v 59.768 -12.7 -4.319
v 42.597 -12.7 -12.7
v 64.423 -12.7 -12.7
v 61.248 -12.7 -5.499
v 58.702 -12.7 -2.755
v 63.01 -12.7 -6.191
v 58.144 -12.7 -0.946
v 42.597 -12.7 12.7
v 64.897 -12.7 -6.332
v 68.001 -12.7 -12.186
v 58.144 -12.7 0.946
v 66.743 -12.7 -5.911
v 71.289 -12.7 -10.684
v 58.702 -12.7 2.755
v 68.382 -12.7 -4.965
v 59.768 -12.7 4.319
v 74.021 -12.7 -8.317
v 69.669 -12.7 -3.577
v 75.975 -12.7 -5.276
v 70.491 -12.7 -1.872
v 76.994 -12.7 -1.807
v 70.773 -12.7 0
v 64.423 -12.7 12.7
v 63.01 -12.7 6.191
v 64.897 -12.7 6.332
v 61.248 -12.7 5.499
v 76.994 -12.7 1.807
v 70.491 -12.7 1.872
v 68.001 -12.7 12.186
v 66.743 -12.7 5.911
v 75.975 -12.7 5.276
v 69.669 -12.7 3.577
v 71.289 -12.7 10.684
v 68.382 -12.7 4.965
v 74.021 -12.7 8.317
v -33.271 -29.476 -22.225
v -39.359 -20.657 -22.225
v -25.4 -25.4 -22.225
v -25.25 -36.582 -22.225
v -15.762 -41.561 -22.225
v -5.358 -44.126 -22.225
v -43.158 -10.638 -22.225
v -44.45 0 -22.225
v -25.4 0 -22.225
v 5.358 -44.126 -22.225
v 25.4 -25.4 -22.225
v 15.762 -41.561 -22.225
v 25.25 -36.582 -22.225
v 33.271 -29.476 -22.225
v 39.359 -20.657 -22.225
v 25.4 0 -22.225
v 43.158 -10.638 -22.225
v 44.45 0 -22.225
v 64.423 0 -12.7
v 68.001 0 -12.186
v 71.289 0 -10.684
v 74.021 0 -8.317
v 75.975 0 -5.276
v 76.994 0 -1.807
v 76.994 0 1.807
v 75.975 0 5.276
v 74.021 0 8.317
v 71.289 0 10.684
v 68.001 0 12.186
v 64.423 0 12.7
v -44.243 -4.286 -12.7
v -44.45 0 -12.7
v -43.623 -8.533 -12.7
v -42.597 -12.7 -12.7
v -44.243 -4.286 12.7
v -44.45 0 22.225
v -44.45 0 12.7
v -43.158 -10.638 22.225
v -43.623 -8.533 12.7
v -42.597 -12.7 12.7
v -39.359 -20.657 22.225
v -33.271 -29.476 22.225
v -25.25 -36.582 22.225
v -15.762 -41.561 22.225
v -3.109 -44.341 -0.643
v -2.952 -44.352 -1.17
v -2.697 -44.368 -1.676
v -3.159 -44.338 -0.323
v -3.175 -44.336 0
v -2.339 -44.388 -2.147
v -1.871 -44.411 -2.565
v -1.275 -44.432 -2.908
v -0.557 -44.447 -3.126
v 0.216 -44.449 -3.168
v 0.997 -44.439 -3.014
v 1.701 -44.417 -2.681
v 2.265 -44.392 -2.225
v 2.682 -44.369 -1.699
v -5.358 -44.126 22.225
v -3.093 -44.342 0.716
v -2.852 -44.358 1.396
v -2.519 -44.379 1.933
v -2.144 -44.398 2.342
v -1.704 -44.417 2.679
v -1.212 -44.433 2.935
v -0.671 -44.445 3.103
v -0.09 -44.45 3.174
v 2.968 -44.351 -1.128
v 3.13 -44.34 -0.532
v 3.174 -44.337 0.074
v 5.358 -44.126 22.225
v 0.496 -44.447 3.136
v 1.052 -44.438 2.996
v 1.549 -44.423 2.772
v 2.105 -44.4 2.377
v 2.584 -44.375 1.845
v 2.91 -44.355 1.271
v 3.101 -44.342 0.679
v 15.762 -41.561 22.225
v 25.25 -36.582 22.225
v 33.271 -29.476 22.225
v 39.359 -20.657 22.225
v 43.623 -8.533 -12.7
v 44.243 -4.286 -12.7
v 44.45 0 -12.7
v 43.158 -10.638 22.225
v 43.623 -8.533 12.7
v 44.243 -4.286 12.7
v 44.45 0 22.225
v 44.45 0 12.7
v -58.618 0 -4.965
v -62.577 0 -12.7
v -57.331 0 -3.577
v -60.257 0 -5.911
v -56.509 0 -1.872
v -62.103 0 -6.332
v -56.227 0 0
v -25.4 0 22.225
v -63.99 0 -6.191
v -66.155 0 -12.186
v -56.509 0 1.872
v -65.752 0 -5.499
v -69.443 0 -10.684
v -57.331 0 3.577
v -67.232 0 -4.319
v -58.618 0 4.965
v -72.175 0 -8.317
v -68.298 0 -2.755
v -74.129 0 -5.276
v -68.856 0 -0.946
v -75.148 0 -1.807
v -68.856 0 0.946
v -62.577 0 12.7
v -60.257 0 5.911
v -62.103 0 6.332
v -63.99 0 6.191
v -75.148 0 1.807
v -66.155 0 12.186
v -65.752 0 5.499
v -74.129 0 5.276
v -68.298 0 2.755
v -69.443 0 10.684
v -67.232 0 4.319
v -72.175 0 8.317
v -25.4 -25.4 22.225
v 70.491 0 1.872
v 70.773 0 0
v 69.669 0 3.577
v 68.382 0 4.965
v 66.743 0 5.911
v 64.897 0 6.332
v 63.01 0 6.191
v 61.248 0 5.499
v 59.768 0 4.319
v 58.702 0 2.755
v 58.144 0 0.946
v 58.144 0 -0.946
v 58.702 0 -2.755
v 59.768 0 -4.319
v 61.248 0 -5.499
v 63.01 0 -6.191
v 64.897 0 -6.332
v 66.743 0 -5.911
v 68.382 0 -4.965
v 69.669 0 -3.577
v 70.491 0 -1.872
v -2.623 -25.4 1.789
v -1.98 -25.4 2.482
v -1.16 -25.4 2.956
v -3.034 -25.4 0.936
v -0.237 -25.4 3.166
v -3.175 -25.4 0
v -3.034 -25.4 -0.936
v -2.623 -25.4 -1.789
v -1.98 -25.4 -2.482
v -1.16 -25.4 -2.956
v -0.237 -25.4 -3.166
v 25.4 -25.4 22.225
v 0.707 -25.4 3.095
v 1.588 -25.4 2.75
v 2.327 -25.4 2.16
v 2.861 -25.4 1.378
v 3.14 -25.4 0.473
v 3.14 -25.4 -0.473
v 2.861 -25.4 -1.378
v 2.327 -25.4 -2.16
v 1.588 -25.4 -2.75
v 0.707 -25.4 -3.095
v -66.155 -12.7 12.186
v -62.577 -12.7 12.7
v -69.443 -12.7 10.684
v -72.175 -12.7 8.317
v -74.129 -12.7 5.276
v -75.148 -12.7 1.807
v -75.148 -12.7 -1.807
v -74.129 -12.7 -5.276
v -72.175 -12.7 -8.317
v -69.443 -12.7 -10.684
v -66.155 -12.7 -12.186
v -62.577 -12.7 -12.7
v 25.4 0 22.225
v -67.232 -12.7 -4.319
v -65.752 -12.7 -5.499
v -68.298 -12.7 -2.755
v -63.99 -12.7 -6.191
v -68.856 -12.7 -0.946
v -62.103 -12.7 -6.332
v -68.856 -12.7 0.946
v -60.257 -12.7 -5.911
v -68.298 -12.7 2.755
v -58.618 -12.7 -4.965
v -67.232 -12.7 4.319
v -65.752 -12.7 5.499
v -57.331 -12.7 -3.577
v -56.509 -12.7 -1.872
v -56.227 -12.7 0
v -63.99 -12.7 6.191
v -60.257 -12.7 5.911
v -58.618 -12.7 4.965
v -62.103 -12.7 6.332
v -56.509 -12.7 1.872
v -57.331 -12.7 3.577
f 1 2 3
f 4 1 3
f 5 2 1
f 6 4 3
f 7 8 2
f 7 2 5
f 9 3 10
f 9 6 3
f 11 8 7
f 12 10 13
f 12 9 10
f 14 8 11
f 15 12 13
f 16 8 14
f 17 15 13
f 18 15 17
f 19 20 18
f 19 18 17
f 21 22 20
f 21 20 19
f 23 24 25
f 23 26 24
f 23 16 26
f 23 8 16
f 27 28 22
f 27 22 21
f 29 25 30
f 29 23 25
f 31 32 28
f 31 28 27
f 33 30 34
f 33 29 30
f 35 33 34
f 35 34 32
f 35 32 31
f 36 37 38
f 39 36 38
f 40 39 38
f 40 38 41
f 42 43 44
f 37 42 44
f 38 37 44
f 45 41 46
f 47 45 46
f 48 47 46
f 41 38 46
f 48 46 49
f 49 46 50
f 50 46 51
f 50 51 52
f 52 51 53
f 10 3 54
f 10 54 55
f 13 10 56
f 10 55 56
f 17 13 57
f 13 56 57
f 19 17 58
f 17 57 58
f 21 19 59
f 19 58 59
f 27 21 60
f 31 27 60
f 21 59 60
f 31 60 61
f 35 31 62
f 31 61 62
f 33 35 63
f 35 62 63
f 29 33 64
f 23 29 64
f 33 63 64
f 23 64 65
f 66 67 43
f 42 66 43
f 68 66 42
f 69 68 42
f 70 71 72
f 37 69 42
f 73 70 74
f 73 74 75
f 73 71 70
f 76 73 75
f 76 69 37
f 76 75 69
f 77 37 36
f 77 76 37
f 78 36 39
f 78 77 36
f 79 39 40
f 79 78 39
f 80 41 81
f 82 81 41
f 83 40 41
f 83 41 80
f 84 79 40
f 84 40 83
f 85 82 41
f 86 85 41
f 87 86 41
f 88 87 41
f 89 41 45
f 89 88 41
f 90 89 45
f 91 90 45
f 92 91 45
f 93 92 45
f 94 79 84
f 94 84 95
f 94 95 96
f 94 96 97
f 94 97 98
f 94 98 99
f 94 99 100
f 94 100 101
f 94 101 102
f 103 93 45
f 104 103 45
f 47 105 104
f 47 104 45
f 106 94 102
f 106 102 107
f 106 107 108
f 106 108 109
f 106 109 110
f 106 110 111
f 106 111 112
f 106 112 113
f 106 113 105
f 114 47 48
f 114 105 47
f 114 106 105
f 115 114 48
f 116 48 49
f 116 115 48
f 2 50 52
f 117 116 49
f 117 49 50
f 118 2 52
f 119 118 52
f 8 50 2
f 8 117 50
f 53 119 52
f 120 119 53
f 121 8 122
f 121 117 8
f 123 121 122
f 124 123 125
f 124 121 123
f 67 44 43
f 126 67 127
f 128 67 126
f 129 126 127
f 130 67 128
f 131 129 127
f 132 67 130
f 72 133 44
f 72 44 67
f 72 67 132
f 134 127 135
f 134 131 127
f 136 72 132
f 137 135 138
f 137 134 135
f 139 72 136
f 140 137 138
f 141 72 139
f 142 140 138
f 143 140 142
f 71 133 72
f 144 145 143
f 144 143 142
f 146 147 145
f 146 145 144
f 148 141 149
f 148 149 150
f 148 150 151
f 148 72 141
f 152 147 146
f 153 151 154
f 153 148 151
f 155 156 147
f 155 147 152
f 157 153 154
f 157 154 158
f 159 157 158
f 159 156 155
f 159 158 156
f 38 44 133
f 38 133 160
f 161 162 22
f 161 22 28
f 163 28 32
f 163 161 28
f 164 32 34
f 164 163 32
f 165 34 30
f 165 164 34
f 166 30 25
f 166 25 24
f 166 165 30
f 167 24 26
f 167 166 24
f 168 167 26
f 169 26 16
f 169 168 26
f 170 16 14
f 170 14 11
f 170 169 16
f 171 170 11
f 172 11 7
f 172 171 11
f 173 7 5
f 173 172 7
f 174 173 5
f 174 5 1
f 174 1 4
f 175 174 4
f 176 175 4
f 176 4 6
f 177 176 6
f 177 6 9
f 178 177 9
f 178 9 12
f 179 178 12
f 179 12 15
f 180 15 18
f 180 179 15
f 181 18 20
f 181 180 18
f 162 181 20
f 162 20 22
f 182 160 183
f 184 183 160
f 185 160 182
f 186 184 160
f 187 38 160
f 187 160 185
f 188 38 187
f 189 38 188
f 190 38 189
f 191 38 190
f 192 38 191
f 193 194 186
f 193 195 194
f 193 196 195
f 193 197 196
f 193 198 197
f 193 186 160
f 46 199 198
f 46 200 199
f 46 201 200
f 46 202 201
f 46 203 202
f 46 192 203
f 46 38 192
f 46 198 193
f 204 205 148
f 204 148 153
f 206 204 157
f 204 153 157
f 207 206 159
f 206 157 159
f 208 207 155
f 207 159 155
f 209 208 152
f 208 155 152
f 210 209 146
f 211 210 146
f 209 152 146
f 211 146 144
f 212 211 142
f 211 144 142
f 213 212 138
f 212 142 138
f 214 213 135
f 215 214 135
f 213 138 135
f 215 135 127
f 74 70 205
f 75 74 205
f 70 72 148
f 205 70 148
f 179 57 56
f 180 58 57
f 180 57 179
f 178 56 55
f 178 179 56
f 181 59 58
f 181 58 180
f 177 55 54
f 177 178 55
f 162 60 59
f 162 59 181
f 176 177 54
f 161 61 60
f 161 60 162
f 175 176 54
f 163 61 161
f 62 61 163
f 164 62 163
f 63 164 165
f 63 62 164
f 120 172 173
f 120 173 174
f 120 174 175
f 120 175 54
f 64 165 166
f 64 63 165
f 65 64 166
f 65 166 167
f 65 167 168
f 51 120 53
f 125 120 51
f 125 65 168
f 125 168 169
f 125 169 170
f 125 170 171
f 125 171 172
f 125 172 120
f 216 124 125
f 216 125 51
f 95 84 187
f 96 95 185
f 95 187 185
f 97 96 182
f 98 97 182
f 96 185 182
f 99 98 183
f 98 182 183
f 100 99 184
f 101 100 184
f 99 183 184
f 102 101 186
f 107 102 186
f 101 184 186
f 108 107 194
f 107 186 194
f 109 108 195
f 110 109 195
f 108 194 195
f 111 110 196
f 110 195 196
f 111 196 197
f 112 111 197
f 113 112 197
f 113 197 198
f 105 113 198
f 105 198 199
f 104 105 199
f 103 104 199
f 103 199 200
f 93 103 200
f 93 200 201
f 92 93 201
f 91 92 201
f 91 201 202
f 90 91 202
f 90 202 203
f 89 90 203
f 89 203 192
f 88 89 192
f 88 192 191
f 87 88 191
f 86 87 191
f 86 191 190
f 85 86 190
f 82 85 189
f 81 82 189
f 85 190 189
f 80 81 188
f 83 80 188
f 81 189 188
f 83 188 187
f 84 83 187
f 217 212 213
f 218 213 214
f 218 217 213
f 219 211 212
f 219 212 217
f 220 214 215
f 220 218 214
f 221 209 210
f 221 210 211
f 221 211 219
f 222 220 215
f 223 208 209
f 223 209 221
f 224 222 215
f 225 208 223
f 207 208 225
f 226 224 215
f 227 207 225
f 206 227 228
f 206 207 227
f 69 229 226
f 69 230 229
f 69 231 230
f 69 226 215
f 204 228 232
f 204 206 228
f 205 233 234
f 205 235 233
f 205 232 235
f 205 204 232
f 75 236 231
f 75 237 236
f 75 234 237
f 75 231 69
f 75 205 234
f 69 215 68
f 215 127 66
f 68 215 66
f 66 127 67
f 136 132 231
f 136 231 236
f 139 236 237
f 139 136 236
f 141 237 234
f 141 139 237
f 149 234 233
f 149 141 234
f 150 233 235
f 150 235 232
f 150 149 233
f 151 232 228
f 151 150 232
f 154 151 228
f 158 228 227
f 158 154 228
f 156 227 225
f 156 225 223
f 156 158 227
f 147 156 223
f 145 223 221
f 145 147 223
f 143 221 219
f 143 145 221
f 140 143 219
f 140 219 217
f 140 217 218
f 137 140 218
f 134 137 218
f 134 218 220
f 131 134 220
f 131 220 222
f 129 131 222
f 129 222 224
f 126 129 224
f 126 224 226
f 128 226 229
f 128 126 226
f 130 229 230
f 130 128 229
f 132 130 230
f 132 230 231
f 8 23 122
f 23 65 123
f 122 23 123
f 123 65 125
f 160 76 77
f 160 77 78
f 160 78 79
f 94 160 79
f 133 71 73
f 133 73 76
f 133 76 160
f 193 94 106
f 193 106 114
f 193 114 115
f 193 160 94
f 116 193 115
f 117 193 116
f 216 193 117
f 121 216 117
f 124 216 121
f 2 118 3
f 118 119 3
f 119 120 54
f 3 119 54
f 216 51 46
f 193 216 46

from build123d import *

# Parameters (mm, degrees)
F0_R     = 6.35
F1_DEPTH = 12.7
F3_DEPTH = 22.225
F4_W     = 50.8
F4_H     = 25.4
F5_DEPTH = 44.45
F6_R     = 3.175
F7_DEPTH = 25.4


with BuildPart() as f1:
    # F0 (on Front) → F1 (new body)
    with BuildSketch(Plane.XZ):
        with BuildLine():
            Line((64.422844, 12.7), (-62.577156, 12.7))
            ThreePointArc((-62.577156, 12.7), (-75.277156, 0), (-62.577156, -12.7))
            Line((-62.577156, -12.7), (64.422844, -12.7))
            ThreePointArc((64.422844, -12.7), (77.122844, 0), (64.422844, 12.7))
        make_face()
        with Locations((-62.577156, 0)):
            Circle(F0_R, mode=Mode.SUBTRACT)
        with Locations((64.422844, 0)):
            Circle(F0_R, mode=Mode.SUBTRACT)
    extrude(amount=F1_DEPTH)

    # F2 (on Top) → F3 (join, symmetric)
    with BuildSketch(Plane.XY):
        with BuildLine():
            Line((44.45, 0), (-44.45, 0))
            ThreePointArc((-44.45, 0), (0, -44.45), (44.45, 0))
        make_face()
    extrude(amount=F3_DEPTH, both=True)

    # F4 (on face) → F5 (cut)
    with BuildSketch(Plane(origin=(0, 0, -22.225), x_dir=(1, 0, 0), z_dir=(0, 0, -1))):
        with Locations((0, 12.7)):
            Rectangle(F4_W, F4_H)
    extrude(amount=-F5_DEPTH, mode=Mode.SUBTRACT)

    # F6 (on face) → F7 (cut)
    with BuildSketch(Plane(origin=(0, -25.4, 0), x_dir=(-1, 0, 0), z_dir=(0, 1, 0))):
        Circle(F6_R)
    extrude(amount=-F7_DEPTH, mode=Mode.SUBTRACT)


solid = f1.part
